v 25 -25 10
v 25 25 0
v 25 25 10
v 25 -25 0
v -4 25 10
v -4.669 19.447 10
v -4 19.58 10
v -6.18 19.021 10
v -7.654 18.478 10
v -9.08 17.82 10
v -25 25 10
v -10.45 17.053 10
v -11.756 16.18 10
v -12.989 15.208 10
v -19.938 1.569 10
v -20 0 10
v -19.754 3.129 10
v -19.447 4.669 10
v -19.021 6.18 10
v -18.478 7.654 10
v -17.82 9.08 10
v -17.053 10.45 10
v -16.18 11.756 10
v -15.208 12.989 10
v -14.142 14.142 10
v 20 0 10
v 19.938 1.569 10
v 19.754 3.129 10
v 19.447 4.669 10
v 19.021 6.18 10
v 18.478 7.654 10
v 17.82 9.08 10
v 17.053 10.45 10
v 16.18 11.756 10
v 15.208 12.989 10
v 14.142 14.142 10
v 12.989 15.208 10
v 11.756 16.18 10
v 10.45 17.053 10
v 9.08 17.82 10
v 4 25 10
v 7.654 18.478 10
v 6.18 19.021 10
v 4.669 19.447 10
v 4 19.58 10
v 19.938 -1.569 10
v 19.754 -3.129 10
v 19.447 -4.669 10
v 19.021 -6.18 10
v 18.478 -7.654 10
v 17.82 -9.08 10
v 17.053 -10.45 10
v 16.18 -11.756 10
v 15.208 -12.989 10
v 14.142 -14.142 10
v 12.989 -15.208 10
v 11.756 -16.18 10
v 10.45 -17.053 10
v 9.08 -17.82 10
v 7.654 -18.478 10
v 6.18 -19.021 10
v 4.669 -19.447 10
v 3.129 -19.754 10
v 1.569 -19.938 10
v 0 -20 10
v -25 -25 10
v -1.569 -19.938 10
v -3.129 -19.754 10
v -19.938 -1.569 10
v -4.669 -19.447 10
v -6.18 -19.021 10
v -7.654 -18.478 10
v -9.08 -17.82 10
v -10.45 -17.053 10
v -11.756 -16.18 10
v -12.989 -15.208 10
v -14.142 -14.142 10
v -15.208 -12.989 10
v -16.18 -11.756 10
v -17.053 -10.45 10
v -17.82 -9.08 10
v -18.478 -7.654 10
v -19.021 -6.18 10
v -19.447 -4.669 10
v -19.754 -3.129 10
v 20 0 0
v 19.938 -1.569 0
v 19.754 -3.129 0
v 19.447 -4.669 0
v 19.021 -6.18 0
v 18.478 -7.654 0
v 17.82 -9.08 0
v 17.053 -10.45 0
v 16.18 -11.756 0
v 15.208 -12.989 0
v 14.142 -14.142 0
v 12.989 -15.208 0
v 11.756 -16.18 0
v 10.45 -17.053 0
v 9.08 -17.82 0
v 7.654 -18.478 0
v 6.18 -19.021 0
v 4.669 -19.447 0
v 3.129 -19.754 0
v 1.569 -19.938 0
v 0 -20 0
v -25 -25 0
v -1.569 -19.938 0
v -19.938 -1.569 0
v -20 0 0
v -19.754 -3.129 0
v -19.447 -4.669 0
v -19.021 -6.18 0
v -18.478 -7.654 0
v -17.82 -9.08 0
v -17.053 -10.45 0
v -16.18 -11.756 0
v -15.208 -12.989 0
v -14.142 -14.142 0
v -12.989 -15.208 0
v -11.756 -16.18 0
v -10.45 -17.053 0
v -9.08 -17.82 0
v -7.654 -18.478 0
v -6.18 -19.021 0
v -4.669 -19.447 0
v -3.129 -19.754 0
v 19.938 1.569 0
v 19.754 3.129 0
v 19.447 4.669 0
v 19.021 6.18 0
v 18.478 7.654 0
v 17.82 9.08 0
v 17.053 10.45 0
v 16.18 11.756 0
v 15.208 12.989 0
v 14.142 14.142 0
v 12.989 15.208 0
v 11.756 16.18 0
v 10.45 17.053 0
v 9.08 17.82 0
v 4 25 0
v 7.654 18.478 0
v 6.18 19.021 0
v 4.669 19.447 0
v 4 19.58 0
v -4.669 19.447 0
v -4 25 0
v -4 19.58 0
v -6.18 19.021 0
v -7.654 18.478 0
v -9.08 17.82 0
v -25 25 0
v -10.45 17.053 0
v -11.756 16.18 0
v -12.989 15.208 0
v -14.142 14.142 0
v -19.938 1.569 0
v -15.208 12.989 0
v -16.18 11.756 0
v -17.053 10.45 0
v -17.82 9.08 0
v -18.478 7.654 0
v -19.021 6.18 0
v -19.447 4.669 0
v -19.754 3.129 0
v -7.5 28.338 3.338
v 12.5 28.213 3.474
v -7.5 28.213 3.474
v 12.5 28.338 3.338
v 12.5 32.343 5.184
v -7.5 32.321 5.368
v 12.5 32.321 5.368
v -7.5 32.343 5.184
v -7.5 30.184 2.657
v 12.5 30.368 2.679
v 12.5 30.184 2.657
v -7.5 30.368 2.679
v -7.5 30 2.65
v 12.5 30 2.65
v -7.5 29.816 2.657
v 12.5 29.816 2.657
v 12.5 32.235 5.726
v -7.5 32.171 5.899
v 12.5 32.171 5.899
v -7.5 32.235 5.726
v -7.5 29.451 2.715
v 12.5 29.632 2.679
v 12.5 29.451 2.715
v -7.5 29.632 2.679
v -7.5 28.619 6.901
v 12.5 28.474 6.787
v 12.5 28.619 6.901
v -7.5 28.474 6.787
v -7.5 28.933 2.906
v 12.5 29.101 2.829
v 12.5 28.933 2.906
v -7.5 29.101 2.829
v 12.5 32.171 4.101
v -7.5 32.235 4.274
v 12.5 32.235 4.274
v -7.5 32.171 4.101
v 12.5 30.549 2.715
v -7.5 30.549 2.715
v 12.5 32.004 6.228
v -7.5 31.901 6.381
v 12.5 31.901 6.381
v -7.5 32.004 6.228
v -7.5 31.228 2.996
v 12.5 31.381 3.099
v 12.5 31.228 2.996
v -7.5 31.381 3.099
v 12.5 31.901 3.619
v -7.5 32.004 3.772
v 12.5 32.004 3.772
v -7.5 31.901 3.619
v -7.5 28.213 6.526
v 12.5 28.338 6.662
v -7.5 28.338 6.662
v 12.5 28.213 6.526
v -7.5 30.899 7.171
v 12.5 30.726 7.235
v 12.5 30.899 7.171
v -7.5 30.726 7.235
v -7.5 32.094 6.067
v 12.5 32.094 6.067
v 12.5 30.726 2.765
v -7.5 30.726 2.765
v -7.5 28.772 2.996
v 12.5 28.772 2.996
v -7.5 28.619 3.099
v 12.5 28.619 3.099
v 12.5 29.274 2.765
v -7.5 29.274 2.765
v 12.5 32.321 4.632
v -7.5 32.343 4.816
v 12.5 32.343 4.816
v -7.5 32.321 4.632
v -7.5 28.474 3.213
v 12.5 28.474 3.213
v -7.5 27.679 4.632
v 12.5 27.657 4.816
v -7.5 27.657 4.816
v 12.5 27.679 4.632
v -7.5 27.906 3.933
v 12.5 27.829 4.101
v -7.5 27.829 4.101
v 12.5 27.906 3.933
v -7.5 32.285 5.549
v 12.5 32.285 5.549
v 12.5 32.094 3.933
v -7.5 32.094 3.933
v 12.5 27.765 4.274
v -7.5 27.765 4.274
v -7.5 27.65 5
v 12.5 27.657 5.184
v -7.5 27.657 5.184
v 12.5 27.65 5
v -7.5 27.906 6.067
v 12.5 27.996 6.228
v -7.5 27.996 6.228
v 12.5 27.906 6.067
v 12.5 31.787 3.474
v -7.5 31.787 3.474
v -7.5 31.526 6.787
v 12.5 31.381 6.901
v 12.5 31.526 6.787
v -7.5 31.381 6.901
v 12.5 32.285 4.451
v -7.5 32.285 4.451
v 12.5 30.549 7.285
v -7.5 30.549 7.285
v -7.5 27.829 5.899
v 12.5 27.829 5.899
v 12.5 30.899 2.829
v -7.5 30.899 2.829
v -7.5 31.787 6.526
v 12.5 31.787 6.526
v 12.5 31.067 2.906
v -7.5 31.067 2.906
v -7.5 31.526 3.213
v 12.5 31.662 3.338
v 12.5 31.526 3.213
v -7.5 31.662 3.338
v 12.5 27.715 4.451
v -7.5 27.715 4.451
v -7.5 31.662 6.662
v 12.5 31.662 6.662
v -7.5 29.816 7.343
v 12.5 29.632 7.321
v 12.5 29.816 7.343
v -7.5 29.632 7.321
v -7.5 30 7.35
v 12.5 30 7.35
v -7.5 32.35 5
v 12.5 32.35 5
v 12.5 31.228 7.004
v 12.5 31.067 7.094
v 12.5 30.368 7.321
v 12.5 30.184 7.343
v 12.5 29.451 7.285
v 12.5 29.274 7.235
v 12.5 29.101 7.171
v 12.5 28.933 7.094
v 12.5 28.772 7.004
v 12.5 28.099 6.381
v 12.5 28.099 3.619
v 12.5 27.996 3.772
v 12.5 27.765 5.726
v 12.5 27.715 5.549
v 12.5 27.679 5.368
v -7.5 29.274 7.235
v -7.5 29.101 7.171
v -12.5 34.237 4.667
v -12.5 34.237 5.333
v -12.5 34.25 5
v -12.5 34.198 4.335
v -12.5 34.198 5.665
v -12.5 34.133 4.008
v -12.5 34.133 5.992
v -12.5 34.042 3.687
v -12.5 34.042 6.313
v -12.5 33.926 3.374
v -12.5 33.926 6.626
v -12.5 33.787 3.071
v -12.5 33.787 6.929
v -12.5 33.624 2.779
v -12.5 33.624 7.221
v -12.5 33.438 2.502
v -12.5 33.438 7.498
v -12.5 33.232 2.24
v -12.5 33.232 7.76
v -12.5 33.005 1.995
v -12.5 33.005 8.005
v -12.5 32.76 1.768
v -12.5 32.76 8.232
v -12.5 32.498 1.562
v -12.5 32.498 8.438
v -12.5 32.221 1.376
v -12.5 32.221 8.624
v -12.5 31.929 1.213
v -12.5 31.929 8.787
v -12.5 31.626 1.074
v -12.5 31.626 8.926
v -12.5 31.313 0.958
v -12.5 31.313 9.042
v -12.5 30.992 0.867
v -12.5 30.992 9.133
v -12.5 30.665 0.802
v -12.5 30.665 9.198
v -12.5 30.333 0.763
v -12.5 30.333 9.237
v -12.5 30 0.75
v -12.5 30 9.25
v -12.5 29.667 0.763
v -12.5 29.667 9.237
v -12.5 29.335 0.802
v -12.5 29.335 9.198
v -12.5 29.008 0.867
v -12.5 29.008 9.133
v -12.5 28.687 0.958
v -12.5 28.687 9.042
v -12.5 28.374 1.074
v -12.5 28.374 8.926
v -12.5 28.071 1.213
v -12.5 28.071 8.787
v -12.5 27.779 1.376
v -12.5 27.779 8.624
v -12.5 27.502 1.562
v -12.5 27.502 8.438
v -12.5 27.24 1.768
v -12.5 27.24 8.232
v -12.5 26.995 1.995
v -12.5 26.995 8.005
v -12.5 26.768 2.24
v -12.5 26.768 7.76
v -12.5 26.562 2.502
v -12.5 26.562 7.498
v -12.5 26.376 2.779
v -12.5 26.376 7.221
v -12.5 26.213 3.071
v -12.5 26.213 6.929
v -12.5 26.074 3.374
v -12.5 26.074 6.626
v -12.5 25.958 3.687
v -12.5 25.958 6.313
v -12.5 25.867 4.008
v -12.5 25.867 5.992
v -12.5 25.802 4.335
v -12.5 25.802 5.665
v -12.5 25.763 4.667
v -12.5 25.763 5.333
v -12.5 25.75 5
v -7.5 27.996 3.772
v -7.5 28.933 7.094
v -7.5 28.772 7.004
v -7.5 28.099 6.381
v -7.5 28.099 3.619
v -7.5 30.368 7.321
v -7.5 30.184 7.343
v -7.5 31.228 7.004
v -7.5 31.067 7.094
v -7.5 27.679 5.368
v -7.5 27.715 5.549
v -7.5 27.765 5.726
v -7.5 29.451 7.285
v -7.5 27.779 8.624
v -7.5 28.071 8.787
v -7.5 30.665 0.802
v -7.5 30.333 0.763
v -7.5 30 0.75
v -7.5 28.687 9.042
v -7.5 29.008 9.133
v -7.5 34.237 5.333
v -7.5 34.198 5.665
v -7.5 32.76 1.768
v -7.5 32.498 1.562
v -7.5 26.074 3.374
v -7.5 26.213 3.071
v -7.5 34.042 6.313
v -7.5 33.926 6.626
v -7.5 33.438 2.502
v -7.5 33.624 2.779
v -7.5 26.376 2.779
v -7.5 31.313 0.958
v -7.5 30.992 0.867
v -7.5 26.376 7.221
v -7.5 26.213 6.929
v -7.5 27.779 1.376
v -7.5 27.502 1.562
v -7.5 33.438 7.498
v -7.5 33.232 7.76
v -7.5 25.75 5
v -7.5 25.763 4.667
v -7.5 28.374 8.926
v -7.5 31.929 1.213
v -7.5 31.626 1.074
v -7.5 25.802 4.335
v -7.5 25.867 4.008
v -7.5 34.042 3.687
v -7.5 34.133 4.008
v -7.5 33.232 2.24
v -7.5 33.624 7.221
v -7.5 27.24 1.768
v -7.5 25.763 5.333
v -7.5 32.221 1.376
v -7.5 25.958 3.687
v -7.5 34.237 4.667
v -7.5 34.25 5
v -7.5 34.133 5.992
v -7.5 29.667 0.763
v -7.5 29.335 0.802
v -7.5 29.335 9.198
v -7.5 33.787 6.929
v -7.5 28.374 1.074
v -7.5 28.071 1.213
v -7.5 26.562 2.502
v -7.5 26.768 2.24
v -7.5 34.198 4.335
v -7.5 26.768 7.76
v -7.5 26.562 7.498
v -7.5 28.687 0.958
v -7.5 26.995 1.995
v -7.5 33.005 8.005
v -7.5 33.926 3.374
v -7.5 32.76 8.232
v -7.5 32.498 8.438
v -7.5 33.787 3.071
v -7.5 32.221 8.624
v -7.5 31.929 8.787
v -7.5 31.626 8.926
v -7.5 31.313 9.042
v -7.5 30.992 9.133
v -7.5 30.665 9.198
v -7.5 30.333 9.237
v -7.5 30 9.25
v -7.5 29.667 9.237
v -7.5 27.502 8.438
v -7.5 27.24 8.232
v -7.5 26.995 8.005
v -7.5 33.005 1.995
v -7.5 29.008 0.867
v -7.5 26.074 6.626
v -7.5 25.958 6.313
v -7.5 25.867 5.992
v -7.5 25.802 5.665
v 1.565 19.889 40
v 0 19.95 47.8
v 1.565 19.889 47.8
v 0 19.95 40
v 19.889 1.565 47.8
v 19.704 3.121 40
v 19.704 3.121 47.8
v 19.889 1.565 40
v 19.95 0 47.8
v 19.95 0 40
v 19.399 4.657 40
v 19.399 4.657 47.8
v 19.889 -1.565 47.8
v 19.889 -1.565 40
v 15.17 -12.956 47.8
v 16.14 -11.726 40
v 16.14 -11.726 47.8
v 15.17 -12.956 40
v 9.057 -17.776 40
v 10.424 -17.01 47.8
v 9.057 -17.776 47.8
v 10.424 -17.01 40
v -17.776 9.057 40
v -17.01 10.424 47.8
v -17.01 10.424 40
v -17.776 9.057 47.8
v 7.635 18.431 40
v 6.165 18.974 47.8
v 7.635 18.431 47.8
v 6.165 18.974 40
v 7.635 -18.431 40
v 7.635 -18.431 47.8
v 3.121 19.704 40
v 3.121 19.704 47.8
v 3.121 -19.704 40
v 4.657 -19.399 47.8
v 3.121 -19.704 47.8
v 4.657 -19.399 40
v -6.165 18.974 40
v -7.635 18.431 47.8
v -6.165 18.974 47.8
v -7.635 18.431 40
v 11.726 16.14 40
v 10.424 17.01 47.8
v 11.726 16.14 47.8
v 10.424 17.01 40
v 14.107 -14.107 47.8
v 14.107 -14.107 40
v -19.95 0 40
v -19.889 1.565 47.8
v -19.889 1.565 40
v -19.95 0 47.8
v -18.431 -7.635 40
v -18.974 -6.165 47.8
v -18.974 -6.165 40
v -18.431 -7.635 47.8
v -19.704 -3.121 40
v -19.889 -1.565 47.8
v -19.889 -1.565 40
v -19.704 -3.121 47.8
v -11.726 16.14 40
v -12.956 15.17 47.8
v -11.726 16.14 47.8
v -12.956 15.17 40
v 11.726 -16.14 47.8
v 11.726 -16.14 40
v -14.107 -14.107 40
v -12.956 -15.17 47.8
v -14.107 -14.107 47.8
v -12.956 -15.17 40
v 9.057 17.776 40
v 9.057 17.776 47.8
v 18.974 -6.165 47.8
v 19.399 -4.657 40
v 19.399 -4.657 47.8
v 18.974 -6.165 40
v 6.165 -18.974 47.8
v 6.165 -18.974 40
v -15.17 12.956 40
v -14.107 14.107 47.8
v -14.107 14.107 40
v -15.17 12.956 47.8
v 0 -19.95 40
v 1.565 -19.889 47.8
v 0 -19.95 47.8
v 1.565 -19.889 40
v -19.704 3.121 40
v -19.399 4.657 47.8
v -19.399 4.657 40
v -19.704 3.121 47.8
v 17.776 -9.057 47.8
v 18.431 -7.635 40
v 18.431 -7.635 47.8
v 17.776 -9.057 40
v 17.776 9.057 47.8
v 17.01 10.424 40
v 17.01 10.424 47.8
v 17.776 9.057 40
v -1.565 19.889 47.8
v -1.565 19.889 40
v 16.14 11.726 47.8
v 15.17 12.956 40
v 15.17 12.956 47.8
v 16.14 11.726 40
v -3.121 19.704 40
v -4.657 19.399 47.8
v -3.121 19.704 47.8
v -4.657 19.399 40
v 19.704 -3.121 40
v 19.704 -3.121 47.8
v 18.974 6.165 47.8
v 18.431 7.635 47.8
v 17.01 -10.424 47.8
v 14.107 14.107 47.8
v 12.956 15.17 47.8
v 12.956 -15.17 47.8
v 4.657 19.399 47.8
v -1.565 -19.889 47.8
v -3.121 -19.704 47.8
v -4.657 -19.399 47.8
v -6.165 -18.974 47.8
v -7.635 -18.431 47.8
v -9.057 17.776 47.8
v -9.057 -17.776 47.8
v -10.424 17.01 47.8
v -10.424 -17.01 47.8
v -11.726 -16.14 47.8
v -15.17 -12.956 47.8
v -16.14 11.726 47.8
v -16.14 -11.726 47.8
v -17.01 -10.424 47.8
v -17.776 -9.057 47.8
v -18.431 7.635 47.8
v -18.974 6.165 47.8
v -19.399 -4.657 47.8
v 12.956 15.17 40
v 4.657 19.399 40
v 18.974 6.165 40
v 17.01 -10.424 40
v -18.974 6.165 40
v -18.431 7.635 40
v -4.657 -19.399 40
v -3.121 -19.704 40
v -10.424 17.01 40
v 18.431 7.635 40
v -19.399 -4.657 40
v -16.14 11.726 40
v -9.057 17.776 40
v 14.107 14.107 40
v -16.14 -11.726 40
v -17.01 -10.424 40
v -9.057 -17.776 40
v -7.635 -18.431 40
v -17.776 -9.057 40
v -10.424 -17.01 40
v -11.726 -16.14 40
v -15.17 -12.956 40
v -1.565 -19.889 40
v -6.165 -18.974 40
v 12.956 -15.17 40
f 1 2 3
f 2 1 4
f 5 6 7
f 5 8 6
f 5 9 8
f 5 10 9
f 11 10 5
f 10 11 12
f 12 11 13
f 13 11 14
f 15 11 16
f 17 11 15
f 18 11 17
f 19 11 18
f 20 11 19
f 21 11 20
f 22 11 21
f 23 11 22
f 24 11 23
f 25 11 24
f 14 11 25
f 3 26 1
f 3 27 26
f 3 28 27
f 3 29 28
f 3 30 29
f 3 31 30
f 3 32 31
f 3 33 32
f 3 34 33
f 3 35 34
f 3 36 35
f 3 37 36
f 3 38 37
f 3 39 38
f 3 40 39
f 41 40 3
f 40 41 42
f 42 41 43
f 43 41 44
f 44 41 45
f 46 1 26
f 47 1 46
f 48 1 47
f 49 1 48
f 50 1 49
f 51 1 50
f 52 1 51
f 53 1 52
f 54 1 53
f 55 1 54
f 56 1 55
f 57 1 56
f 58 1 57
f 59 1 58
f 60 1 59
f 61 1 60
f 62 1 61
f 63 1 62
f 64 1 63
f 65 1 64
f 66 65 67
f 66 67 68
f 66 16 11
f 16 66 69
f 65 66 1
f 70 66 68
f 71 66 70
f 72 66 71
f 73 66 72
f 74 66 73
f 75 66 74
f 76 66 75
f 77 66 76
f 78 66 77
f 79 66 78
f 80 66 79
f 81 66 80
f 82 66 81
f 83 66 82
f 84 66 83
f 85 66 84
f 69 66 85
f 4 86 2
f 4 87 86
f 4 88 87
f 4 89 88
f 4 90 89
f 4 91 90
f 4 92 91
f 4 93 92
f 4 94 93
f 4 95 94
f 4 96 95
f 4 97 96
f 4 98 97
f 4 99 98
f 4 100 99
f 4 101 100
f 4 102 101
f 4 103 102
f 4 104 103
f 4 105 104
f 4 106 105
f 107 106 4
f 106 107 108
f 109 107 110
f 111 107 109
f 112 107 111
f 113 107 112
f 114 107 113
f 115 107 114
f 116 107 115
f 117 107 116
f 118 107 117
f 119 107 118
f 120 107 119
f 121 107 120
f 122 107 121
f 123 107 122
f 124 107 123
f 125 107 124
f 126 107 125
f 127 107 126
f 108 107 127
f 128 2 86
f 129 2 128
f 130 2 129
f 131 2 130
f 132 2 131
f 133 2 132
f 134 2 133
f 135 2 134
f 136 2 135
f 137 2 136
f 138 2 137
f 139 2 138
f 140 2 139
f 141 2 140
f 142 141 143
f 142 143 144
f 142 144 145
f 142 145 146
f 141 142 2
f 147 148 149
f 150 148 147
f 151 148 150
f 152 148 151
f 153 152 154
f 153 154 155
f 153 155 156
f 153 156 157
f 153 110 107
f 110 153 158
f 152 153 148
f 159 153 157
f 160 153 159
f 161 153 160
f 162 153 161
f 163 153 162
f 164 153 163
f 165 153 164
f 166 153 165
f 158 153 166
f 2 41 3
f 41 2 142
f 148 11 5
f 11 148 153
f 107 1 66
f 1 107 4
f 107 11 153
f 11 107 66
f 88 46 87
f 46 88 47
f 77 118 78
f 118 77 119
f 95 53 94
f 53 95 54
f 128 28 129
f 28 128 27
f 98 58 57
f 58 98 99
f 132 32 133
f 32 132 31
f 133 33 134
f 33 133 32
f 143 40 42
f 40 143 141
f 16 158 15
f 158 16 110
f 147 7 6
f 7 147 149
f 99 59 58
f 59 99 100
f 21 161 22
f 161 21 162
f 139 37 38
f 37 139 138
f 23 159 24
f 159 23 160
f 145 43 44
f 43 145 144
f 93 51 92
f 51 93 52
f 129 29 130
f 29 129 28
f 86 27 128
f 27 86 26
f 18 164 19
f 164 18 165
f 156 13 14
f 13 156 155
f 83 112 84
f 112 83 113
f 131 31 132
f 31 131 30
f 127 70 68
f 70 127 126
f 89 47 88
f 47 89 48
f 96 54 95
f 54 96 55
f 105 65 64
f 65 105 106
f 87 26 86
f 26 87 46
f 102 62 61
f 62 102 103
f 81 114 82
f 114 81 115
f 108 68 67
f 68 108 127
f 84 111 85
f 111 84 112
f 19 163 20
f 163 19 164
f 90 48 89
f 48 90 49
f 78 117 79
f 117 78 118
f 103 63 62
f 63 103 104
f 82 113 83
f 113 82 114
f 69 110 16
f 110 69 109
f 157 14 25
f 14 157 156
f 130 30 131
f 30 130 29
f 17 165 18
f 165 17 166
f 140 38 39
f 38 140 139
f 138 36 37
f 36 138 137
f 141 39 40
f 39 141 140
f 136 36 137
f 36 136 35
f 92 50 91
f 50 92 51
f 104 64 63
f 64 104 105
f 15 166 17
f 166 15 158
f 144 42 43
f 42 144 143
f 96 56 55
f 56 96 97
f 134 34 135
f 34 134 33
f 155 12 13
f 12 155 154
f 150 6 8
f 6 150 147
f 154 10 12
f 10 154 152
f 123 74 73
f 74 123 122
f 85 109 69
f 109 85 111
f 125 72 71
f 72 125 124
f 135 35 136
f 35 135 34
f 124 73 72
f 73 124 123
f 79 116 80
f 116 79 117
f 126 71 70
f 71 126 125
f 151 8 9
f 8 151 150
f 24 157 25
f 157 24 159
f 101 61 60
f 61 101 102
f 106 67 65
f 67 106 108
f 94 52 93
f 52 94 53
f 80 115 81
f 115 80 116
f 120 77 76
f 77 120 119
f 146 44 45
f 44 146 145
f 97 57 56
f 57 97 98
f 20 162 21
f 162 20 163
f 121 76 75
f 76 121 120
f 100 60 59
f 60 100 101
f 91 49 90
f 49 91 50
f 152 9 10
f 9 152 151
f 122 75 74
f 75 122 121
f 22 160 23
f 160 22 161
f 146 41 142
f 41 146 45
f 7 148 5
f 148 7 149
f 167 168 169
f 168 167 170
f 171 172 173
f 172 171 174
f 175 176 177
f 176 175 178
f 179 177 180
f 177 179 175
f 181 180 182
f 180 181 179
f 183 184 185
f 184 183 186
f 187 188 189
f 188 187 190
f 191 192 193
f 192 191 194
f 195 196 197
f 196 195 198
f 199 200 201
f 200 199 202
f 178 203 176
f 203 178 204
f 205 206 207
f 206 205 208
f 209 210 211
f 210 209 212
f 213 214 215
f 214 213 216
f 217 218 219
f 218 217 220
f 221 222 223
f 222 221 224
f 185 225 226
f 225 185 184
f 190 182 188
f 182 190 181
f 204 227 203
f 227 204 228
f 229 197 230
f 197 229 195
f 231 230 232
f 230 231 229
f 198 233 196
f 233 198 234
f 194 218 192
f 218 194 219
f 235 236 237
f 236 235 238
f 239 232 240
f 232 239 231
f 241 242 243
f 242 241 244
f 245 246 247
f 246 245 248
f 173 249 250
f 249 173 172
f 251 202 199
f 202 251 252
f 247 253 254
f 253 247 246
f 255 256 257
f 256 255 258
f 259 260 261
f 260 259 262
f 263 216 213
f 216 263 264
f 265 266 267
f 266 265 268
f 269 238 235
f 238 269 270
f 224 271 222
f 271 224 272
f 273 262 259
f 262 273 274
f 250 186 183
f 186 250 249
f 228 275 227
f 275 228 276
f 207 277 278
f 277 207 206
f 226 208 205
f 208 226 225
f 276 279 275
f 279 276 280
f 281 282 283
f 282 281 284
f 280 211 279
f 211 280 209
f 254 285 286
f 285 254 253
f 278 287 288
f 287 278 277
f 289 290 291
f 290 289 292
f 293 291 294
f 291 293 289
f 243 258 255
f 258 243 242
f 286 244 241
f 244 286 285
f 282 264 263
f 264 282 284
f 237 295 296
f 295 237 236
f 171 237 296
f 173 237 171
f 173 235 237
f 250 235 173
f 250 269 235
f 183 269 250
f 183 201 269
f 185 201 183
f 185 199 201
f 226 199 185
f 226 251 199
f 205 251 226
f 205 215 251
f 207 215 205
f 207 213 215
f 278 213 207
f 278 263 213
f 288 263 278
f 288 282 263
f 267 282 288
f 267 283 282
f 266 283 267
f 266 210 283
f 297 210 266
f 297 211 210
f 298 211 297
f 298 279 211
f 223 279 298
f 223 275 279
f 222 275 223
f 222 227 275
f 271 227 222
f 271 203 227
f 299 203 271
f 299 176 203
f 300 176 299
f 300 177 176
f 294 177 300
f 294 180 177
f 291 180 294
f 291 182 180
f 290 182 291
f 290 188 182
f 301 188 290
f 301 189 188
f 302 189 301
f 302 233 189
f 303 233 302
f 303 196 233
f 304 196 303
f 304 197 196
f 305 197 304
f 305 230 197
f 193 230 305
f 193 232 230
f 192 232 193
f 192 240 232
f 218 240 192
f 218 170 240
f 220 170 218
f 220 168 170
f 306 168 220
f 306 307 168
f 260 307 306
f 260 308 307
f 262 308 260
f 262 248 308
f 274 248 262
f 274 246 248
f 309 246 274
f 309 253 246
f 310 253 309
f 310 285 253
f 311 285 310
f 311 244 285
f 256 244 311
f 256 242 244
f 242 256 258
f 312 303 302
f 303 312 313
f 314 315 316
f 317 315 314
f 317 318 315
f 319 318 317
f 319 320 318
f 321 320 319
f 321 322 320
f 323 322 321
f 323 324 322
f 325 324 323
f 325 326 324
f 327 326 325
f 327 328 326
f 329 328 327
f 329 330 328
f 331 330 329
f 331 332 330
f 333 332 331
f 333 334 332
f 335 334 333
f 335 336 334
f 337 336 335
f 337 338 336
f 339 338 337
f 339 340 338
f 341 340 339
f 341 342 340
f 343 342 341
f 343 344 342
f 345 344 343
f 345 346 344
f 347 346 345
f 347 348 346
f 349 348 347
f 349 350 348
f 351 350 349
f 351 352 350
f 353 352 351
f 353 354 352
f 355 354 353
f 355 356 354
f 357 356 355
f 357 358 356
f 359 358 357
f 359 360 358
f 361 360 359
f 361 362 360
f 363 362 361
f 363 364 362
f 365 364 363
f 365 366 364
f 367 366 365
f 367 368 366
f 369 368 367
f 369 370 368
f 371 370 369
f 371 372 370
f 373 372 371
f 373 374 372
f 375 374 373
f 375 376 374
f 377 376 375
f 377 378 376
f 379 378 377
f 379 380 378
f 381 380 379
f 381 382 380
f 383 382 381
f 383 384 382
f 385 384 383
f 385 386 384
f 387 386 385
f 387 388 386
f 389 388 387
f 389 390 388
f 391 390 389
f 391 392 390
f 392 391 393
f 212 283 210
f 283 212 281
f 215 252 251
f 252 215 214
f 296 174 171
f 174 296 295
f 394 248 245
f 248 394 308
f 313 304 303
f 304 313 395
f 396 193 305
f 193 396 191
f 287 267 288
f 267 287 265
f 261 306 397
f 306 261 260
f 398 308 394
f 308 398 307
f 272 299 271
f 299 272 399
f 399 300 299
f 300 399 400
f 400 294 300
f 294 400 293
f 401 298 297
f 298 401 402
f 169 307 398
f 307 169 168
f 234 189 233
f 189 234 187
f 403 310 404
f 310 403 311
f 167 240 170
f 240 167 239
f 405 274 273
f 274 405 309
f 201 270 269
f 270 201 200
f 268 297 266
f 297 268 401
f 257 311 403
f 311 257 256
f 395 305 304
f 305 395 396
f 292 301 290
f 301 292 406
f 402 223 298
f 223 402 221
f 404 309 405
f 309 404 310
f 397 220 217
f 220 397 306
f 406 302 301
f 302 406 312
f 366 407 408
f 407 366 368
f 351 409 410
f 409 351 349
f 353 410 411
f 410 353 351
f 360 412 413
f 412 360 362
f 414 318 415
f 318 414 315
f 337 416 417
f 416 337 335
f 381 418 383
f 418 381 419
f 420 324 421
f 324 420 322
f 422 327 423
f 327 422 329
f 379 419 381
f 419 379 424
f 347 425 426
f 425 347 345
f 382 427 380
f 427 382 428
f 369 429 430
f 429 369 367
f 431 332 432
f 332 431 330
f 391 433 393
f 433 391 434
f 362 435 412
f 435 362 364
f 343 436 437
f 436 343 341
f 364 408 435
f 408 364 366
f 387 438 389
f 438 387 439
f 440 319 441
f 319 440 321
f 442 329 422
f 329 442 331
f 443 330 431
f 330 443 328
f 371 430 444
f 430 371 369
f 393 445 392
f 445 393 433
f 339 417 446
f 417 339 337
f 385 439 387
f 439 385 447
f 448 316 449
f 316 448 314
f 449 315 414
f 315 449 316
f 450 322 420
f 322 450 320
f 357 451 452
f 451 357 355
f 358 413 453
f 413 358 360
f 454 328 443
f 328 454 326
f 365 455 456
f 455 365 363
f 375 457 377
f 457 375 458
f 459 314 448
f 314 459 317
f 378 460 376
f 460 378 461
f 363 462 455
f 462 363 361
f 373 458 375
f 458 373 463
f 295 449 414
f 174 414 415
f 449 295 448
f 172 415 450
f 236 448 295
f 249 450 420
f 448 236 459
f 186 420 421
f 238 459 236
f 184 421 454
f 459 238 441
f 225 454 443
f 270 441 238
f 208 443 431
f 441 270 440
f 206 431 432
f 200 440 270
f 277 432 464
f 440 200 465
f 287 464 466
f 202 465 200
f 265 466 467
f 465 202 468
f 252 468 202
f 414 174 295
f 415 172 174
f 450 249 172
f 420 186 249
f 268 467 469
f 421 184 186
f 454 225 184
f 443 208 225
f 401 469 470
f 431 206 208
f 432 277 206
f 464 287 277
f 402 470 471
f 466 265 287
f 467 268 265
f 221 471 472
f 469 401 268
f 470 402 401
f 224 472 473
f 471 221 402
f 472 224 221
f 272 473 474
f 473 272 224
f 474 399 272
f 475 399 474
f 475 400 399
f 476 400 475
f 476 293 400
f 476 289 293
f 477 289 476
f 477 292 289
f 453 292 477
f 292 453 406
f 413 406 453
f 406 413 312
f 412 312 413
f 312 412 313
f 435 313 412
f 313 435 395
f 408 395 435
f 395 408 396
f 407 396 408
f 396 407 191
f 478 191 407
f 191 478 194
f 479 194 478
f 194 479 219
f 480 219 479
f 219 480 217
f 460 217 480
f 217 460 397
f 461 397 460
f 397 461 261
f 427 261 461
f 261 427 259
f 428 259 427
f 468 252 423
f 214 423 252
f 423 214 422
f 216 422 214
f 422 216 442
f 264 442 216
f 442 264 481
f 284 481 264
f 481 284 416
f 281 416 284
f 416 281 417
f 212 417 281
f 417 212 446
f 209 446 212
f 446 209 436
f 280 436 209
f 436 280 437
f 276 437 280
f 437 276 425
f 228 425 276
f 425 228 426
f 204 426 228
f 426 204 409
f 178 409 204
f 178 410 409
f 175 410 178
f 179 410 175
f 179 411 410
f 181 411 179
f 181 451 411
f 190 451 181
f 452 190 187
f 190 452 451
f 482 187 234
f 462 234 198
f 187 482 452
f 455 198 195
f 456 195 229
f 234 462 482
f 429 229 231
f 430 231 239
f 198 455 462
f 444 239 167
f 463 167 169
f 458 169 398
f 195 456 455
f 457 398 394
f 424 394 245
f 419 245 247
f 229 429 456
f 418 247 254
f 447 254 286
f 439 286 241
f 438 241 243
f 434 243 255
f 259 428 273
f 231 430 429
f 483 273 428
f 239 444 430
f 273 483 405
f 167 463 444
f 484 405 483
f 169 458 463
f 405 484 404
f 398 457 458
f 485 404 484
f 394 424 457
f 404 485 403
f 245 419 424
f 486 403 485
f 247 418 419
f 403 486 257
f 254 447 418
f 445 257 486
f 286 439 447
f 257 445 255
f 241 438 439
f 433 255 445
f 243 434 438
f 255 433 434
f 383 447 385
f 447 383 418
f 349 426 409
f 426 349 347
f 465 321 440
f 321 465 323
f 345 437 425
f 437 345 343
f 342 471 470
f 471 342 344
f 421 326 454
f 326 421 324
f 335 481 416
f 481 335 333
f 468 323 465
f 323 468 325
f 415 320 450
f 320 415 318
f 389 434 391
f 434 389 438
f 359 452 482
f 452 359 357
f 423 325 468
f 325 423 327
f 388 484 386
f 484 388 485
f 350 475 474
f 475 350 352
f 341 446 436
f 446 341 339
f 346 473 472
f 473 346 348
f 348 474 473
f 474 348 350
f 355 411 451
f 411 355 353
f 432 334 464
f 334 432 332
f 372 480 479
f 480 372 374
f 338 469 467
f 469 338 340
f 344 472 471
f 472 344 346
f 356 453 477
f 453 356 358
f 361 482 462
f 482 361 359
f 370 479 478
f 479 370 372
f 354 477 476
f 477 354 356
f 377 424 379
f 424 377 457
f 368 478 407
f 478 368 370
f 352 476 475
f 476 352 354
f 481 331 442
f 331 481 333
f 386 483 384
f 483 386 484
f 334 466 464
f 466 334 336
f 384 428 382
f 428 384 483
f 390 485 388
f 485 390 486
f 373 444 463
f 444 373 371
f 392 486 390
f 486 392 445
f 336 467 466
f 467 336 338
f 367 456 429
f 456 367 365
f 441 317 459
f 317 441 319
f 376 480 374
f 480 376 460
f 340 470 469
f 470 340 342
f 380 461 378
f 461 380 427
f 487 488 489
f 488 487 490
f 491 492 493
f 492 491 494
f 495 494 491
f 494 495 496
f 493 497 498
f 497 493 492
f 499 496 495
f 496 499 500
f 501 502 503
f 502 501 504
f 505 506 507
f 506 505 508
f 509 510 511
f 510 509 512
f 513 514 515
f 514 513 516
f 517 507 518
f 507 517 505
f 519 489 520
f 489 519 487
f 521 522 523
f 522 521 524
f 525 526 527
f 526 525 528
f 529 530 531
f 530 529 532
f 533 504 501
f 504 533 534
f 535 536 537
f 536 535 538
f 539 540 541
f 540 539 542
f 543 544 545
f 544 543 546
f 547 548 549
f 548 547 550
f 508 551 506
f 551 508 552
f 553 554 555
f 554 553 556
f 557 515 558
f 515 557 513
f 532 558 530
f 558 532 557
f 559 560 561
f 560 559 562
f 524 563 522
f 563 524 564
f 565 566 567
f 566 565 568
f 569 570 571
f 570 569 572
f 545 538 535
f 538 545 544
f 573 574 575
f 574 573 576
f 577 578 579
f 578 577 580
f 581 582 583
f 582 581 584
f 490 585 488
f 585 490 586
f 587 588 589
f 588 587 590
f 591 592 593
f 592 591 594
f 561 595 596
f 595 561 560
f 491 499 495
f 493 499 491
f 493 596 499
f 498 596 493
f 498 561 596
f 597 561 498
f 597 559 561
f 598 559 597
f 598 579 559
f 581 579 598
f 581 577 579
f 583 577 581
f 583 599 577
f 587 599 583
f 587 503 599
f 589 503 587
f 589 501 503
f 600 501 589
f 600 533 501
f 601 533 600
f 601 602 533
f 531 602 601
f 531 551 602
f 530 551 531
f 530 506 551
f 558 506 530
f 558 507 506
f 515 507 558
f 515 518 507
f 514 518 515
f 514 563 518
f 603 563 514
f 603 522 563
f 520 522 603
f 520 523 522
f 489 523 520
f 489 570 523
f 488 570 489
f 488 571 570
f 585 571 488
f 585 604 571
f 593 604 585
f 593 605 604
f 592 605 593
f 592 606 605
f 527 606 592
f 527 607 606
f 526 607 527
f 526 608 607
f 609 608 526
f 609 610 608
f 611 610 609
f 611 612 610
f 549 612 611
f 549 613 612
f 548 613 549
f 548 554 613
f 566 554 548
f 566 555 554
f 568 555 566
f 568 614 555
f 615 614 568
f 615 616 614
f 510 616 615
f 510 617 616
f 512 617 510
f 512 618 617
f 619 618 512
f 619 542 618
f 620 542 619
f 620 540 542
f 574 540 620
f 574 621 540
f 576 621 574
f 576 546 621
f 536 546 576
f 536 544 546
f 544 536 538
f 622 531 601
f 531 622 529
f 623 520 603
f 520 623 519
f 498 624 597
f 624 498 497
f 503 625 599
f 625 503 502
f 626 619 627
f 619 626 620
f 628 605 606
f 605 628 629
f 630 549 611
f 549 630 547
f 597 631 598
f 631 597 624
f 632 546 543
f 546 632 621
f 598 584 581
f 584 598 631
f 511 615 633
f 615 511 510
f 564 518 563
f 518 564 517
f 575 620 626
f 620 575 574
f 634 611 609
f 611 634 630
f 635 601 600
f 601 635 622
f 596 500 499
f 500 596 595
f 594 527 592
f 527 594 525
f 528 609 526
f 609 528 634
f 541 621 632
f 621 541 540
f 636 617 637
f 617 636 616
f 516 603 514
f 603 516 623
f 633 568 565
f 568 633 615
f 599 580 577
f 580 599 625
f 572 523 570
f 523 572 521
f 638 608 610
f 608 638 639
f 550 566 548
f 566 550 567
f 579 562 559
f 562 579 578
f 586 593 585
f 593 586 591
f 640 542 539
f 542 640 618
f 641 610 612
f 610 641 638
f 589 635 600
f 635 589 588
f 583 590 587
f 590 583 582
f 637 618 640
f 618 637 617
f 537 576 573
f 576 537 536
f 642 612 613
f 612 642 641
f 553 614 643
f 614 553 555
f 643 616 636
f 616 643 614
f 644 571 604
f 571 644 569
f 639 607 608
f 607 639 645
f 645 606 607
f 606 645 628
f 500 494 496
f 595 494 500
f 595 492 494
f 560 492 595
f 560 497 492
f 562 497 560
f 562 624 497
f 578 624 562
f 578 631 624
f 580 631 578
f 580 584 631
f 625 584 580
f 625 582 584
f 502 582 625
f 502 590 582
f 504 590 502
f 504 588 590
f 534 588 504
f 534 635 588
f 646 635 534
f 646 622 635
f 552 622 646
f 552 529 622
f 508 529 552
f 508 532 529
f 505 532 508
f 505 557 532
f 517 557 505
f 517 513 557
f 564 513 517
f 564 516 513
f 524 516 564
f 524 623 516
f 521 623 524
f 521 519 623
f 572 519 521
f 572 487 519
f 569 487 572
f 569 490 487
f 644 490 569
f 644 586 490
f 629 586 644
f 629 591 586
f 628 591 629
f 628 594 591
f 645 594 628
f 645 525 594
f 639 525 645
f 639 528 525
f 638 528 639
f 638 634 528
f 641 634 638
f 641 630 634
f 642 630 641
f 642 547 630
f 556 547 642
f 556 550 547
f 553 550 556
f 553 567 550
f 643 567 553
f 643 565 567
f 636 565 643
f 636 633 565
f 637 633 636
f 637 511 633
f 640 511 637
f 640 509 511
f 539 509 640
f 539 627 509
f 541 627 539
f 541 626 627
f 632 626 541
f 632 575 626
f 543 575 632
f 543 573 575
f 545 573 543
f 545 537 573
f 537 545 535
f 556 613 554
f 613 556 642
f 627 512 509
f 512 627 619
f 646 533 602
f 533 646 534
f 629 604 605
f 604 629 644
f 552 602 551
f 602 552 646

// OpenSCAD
$fn=80;
translate([0,0,40]) cylinder(d=39.9, h=7.8);

// object will require a clamp

clamp_h=10;
difference() {
  union() {
    translate([0,-25,0]) cube([25,50,clamp_h]);
    translate([-50/2,-50/2,0]) cube([25,50,clamp_h]);
  }
  translate([0,0,-1]) cylinder(d=40, h=40);
  hole_size = 8;
  translate([-hole_size/2,-0,-1]){
    cube([hole_size,50,20]);
  }
}

//bolt

module bolt() {
cylinder(d=4.7, h=25);
cylinder(d=8.5, h=5);
}

translate([-25/2,30,clamp_h/2]) rotate([0,90,0]) bolt();
